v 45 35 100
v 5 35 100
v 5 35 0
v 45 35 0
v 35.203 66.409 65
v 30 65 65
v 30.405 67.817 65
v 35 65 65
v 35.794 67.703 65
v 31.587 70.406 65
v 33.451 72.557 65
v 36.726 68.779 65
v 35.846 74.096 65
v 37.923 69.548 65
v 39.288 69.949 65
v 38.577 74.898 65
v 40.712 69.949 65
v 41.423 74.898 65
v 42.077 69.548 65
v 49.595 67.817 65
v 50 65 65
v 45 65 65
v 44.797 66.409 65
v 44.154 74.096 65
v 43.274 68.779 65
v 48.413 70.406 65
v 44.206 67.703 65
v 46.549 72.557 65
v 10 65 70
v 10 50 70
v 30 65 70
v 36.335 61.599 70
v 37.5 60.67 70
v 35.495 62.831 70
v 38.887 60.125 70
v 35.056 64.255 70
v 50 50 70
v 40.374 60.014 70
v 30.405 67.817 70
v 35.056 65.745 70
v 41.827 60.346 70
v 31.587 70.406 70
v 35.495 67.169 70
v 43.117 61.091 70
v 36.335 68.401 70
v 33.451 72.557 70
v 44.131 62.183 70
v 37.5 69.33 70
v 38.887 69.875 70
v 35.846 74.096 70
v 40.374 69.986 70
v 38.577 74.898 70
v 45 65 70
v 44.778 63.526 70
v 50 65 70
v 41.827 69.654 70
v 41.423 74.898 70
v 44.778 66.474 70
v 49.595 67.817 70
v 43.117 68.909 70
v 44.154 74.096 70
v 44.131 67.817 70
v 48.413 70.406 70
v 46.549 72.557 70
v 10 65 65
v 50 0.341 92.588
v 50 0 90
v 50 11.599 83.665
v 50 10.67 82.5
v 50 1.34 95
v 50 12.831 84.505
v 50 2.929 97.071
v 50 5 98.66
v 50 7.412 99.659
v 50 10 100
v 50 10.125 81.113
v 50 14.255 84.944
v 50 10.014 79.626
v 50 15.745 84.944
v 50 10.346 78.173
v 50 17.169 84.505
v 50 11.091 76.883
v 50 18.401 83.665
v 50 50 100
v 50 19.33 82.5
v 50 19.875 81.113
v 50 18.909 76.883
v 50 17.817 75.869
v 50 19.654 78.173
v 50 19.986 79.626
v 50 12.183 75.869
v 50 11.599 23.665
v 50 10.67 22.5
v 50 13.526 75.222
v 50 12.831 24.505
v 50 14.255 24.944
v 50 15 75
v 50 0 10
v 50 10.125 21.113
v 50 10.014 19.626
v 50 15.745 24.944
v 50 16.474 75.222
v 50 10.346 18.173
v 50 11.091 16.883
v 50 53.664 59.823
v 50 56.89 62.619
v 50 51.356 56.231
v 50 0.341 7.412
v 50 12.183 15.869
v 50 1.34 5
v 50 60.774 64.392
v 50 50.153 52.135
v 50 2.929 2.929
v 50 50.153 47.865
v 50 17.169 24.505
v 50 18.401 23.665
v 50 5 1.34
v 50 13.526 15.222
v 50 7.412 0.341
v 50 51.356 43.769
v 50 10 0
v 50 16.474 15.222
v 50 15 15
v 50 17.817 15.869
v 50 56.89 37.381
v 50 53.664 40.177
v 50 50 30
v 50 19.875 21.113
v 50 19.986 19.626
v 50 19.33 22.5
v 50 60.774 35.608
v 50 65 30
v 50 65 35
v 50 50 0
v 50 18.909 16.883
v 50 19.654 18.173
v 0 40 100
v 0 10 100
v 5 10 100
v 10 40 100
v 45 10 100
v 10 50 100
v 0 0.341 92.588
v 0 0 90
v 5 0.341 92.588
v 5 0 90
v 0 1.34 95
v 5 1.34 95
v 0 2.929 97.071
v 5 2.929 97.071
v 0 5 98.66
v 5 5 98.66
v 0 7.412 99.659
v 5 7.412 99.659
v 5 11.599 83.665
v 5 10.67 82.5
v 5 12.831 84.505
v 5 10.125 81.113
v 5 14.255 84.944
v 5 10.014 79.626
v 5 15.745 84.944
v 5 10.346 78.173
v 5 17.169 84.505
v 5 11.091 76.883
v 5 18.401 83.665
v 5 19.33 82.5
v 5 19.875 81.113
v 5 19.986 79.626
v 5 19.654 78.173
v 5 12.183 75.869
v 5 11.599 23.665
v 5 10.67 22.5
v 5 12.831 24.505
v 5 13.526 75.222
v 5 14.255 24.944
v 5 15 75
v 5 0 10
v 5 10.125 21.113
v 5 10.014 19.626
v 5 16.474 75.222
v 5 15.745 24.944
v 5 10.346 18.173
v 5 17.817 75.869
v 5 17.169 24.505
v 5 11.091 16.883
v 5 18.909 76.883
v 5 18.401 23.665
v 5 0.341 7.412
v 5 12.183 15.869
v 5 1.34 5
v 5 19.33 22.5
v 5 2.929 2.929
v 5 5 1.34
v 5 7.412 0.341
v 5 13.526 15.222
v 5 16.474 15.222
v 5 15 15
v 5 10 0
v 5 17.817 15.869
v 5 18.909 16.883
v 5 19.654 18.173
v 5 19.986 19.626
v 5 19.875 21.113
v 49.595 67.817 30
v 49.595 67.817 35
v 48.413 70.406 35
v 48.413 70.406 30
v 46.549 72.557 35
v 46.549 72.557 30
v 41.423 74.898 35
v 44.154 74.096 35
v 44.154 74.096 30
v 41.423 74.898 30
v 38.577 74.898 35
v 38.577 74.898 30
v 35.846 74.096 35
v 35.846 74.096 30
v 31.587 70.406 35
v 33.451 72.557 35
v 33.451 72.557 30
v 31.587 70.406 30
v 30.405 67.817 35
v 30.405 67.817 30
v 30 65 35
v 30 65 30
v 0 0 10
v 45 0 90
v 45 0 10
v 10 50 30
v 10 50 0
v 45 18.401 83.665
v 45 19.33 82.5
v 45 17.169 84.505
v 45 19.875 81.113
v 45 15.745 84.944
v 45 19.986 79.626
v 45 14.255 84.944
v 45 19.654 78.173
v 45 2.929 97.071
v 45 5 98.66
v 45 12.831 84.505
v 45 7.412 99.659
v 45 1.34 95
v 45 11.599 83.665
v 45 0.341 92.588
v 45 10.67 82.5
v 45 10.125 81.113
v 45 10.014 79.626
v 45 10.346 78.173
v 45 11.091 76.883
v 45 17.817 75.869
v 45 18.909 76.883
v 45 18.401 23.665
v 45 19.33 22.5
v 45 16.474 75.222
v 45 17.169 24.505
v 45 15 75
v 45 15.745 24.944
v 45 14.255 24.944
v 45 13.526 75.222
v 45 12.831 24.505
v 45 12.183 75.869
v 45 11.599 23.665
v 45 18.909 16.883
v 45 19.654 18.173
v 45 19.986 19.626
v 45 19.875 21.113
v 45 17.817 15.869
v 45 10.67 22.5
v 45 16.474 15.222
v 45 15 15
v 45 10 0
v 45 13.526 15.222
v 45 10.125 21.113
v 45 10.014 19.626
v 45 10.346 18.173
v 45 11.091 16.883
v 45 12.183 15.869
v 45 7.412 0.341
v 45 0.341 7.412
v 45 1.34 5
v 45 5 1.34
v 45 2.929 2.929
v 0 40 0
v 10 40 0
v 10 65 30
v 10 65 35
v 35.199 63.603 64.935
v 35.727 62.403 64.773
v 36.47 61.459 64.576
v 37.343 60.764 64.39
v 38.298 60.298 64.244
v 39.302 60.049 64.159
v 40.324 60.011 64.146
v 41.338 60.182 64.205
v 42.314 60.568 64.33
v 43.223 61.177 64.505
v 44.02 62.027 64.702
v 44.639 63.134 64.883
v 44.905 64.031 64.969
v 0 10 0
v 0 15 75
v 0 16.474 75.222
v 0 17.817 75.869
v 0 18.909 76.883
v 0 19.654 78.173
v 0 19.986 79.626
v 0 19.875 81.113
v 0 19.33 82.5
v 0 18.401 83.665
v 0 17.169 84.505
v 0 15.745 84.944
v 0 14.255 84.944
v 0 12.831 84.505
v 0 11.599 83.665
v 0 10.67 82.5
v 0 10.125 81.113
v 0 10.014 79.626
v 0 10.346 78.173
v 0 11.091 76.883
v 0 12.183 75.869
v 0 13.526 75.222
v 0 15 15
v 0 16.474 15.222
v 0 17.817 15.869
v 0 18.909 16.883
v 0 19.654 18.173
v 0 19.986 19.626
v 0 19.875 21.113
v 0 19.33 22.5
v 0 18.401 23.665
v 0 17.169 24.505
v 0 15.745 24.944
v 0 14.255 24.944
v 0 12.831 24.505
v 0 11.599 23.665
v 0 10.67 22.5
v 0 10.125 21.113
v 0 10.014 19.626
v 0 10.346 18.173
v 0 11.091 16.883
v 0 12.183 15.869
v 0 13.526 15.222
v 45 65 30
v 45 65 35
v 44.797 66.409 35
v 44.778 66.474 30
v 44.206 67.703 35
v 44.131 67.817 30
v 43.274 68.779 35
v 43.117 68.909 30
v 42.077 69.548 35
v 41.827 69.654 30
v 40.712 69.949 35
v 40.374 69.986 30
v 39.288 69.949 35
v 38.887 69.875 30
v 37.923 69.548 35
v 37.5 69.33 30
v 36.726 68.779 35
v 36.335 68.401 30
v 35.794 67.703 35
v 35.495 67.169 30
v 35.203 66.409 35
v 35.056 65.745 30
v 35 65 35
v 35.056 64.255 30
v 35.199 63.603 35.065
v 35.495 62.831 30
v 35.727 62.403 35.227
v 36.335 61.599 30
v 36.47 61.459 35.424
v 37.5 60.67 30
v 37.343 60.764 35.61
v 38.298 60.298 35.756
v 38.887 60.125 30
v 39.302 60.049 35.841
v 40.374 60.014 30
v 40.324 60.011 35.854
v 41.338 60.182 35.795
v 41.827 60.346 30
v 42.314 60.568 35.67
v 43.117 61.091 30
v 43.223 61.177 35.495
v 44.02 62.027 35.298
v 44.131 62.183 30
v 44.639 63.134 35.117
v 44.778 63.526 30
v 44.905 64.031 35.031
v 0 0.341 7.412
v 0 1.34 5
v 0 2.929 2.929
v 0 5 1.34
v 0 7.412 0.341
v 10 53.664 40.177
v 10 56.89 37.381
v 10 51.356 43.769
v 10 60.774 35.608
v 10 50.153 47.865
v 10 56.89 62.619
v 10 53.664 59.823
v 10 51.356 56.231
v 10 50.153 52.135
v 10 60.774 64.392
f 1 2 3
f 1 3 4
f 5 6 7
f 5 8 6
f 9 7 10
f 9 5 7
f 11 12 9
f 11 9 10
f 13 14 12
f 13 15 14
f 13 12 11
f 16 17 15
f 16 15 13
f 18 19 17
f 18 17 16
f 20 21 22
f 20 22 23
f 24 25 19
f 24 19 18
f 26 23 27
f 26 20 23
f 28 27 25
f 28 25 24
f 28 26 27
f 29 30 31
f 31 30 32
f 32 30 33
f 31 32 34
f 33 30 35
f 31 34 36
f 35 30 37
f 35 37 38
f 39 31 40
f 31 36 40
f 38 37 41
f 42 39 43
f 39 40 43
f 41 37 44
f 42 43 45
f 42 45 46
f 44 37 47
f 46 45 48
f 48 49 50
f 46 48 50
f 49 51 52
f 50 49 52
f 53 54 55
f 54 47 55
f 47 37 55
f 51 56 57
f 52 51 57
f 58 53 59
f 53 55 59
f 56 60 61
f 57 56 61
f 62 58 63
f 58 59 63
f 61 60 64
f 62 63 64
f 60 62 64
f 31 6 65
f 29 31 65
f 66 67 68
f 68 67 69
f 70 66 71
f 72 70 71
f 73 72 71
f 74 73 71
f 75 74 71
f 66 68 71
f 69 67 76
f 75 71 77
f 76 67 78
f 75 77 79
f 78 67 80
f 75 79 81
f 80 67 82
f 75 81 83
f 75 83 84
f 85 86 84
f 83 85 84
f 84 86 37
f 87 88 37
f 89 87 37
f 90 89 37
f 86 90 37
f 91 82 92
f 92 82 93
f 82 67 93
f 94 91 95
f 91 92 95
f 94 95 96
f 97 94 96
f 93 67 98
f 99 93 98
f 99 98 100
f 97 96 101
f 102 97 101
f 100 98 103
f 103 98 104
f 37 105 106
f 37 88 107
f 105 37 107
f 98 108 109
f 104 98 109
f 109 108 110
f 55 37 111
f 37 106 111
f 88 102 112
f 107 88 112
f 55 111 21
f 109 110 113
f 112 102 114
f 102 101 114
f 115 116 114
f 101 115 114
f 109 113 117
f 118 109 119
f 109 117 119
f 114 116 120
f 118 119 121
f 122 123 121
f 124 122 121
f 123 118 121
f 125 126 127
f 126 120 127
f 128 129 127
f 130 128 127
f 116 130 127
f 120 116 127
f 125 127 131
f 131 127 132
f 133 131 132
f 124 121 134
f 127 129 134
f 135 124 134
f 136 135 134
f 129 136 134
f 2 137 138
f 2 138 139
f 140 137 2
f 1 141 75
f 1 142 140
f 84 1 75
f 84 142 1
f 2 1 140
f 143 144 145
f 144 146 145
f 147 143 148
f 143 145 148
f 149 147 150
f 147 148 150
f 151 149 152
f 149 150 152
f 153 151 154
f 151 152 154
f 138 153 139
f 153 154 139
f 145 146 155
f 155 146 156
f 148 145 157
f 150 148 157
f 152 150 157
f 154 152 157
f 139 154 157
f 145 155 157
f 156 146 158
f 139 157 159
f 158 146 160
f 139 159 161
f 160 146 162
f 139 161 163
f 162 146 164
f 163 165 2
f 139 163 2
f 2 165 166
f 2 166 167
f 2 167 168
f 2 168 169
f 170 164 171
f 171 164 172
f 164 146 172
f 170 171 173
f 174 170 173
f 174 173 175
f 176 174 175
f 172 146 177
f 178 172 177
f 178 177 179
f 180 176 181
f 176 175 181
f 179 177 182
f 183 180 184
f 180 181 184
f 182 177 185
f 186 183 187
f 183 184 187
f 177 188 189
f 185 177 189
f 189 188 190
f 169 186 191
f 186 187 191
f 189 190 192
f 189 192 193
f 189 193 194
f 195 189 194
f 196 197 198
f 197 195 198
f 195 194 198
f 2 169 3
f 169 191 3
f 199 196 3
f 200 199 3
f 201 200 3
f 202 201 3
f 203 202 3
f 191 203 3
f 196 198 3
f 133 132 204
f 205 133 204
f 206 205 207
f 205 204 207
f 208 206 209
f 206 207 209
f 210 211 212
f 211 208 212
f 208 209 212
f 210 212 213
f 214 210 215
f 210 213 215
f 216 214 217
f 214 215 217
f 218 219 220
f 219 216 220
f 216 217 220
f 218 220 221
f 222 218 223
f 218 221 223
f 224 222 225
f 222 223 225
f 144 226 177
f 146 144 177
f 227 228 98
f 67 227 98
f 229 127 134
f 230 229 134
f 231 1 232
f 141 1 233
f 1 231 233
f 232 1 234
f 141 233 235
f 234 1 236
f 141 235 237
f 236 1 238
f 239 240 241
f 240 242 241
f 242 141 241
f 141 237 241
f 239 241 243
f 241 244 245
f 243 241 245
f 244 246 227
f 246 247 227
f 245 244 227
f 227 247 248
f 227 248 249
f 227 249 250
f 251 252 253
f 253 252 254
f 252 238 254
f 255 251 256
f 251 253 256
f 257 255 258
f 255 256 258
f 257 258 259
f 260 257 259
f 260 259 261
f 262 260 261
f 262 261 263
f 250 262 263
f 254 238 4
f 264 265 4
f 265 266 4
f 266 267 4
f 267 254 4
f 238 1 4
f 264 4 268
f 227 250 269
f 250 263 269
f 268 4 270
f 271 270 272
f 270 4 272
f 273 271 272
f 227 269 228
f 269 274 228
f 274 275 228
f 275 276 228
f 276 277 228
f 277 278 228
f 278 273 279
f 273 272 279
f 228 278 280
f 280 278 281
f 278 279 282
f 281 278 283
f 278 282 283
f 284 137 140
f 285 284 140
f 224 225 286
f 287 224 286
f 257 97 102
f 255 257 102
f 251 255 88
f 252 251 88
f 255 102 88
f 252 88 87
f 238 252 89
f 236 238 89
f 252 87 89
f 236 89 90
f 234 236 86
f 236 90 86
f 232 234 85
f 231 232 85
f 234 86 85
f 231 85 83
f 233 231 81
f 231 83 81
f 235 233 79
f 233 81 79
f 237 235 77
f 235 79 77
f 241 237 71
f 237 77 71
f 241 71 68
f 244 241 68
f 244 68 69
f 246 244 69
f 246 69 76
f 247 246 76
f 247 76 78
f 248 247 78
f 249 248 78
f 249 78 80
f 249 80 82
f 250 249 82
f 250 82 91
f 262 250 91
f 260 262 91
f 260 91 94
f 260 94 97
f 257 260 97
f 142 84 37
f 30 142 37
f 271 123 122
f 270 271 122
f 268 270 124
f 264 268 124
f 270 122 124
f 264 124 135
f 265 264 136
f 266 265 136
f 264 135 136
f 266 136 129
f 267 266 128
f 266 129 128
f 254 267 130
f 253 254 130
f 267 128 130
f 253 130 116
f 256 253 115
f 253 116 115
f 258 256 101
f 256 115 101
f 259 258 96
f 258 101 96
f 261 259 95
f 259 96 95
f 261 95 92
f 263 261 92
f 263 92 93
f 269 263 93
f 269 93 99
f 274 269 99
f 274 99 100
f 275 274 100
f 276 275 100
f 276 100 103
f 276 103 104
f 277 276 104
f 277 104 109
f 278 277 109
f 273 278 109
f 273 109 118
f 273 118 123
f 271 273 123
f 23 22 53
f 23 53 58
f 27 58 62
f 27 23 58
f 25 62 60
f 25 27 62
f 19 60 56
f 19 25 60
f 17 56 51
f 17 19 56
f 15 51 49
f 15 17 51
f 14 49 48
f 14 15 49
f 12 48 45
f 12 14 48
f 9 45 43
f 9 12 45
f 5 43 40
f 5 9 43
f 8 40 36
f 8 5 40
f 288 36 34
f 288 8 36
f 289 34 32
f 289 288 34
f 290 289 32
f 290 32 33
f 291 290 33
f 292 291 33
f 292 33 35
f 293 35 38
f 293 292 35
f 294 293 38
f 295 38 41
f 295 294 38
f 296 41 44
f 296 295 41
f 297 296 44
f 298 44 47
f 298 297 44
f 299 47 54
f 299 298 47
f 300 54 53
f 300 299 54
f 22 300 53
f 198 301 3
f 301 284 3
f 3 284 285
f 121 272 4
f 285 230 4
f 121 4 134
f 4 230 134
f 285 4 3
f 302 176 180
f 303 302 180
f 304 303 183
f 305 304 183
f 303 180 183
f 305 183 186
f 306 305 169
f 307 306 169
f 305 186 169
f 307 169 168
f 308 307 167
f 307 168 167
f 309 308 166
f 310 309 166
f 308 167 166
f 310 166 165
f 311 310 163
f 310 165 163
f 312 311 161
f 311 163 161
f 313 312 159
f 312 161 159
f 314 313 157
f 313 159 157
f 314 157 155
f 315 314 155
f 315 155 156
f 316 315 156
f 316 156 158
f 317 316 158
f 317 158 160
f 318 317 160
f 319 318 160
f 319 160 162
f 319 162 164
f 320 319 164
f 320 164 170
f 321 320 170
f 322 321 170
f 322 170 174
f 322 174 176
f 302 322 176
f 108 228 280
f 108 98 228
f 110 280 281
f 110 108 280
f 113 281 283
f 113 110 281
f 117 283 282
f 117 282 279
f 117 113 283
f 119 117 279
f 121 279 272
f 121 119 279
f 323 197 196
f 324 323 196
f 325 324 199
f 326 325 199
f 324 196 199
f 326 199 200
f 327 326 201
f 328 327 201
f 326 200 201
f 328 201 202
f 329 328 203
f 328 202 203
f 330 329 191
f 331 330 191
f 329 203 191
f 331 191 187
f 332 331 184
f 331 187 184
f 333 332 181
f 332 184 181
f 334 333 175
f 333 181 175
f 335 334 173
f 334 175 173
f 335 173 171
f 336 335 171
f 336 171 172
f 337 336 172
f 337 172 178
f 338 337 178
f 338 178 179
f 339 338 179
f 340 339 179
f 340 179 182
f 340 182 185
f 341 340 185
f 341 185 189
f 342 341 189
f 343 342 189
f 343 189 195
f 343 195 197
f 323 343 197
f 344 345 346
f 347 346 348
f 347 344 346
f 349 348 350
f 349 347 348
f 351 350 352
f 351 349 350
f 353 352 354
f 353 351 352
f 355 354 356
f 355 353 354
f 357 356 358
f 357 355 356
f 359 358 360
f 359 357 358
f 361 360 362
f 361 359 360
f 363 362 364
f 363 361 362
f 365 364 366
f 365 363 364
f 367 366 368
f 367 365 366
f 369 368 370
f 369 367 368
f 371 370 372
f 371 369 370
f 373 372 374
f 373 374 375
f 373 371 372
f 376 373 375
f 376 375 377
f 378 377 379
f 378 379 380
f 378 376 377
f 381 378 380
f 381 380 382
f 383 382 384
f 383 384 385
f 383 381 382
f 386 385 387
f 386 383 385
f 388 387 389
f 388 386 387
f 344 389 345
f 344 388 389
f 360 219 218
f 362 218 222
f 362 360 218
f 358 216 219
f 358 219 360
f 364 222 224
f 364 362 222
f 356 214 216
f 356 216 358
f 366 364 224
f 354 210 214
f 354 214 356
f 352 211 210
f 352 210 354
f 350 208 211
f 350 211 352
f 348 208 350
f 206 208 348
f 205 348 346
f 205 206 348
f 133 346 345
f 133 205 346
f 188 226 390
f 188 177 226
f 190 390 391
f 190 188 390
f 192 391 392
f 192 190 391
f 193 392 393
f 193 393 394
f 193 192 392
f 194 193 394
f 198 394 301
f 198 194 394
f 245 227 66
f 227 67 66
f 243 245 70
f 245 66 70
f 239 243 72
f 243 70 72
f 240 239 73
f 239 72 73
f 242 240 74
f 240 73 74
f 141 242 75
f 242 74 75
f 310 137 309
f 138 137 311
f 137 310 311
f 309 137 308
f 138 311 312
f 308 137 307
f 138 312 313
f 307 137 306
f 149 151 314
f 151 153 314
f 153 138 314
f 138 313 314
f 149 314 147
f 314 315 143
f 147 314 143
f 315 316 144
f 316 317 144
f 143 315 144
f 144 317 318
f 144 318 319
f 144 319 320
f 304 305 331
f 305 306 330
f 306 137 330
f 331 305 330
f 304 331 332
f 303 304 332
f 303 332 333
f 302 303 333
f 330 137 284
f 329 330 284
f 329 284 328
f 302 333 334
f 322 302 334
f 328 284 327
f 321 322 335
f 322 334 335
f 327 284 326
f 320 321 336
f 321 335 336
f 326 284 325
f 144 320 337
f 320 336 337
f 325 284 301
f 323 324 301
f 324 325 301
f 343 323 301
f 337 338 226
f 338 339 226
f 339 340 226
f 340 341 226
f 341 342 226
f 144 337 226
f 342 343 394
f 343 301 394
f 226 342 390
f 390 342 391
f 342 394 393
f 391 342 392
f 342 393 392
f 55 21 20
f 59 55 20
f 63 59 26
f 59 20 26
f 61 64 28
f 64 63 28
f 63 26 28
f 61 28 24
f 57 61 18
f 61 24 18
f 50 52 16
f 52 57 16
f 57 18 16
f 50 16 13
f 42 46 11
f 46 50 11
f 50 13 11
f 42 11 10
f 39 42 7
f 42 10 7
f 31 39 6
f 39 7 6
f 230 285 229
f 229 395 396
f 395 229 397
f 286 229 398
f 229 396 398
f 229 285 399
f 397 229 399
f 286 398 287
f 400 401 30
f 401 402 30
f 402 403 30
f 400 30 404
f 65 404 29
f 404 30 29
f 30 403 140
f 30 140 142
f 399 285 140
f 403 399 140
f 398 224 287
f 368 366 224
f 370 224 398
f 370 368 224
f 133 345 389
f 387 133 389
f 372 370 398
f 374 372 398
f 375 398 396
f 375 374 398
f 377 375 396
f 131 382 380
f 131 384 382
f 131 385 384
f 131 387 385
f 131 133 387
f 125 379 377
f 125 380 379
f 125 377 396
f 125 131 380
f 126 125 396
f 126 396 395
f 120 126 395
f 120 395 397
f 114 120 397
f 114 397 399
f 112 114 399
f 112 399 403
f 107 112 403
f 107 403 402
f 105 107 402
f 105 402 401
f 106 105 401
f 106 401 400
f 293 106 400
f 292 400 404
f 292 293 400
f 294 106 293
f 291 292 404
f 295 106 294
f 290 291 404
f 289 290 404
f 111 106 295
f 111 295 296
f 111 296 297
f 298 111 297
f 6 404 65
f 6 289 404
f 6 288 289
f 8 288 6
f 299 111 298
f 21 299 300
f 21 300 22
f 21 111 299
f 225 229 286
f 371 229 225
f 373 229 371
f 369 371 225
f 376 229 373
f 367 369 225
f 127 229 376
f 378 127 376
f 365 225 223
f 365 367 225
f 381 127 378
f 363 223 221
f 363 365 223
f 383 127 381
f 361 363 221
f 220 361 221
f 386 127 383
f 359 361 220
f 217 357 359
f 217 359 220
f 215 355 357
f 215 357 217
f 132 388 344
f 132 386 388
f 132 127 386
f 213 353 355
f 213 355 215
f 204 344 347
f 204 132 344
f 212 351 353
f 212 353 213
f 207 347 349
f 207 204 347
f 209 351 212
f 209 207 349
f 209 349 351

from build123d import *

# Parameters (mm, degrees)
SKETCH1_R               = 5
BOSS_EXTRUDE1_DEPTH     = 100
SKETCH2_R               = 5
SKETCH2_W               = 30
SKETCH2_H               = 25
CUT_EXTRUDE1_DEPTH      = 100
FILLET1_R               = 10
SKETCH4_W               = 40
SKETCH4_H               = 100
BOSS_EXTRUDE2_DEPTH     = 10
SKETCH5_W               = 10
SKETCH5_H               = 20
CUT_EXTRUDE2_DEPTH      = 101
CUT_EXTRUDE2_DEPTH_BACK = 1
SKETCH6_W               = 10
SKETCH6_H               = 5
CUT_EXTRUDE3_DEPTH      = 1
CUT_EXTRUDE3_DEPTH_BACK = 101


with BuildPart() as part:
    # Sketch1 → Boss-Extrude1 (new body)
    with BuildSketch(Plane.XY):
        with BuildLine():
            Line((50, 0), (50, 65))
            ThreePointArc((50, 65), (40, 75), (30, 65))
            Line((30, 65), (0, 65))
            Line((0, 65), (0, 0))
            Line((0, 0), (5, 0))
            Line((5, 0), (5, 45))
            Line((5, 45), (45, 45))
            Line((45, 45), (45, 0))
            Line((45, 0), (50, 0))
        make_face()
        with Locations((40, 65)):
            Circle(SKETCH1_R, mode=Mode.SUBTRACT)
    extrude(amount=BOSS_EXTRUDE1_DEPTH)

    # Sketch2 → Cut-Extrude1 (cut)
    with BuildSketch(Plane(origin=(50, 0, 0), x_dir=(0, 0, -1), z_dir=(1, 0, 0))):
        with Locations((-80, 15)):
            Circle(SKETCH2_R)
        with Locations((-20, 15)):
            Circle(SKETCH2_R)
        with BuildLine():
            Line((-65, 65), (-65, 75))
            Line((-65, 75), (-35, 75))
            Line((-35, 75), (-35, 65))
            ThreePointArc((-35, 65), (-50, 50), (-65, 65))
        make_face()
        with Locations((-85, 62.5)):
            Rectangle(SKETCH2_W, SKETCH2_H)
        with Locations((-15, 62.5)):
            Rectangle(SKETCH2_W, SKETCH2_H)
    extrude(amount=-CUT_EXTRUDE1_DEPTH, mode=Mode.SUBTRACT)

    # Fillet1
    fillet1_edges = [part.edges().sort_by_distance(p)[0] for p in [
        (47.5, 0, 0),
        (2.5, 0, 0),
        (2.5, 0, 100),
        (47.5, 0, 100),
    ]]
    fillet(fillet1_edges, radius=FILLET1_R)

    # Sketch4 → Boss-Extrude2 (add)
    with BuildSketch(Plane.XZ.offset(-45)):
        with Locations((25, 50)):
            Rectangle(SKETCH4_W, SKETCH4_H)
    extrude(amount=BOSS_EXTRUDE2_DEPTH)

    # Sketch5 → Cut-Extrude2 (cut, two sides)
    with BuildSketch(Plane.XY) as cut_extrude2_sk:
        with Locations((5, 55)):
            Rectangle(SKETCH5_W, SKETCH5_H)
    extrude(amount=CUT_EXTRUDE2_DEPTH, mode=Mode.SUBTRACT)
    extrude(cut_extrude2_sk.sketch, amount=-CUT_EXTRUDE2_DEPTH_BACK, mode=Mode.SUBTRACT)

    # Sketch6 → Cut-Extrude3 (cut, two sides)
    with BuildSketch(Plane.XY.offset(100)) as cut_extrude3_sk:
        with Locations((5, 42.5)):
            Rectangle(SKETCH6_W, SKETCH6_H)
    extrude(amount=CUT_EXTRUDE3_DEPTH, mode=Mode.SUBTRACT)
    extrude(cut_extrude3_sk.sketch, amount=-CUT_EXTRUDE3_DEPTH_BACK, mode=Mode.SUBTRACT)


solid = part.part
